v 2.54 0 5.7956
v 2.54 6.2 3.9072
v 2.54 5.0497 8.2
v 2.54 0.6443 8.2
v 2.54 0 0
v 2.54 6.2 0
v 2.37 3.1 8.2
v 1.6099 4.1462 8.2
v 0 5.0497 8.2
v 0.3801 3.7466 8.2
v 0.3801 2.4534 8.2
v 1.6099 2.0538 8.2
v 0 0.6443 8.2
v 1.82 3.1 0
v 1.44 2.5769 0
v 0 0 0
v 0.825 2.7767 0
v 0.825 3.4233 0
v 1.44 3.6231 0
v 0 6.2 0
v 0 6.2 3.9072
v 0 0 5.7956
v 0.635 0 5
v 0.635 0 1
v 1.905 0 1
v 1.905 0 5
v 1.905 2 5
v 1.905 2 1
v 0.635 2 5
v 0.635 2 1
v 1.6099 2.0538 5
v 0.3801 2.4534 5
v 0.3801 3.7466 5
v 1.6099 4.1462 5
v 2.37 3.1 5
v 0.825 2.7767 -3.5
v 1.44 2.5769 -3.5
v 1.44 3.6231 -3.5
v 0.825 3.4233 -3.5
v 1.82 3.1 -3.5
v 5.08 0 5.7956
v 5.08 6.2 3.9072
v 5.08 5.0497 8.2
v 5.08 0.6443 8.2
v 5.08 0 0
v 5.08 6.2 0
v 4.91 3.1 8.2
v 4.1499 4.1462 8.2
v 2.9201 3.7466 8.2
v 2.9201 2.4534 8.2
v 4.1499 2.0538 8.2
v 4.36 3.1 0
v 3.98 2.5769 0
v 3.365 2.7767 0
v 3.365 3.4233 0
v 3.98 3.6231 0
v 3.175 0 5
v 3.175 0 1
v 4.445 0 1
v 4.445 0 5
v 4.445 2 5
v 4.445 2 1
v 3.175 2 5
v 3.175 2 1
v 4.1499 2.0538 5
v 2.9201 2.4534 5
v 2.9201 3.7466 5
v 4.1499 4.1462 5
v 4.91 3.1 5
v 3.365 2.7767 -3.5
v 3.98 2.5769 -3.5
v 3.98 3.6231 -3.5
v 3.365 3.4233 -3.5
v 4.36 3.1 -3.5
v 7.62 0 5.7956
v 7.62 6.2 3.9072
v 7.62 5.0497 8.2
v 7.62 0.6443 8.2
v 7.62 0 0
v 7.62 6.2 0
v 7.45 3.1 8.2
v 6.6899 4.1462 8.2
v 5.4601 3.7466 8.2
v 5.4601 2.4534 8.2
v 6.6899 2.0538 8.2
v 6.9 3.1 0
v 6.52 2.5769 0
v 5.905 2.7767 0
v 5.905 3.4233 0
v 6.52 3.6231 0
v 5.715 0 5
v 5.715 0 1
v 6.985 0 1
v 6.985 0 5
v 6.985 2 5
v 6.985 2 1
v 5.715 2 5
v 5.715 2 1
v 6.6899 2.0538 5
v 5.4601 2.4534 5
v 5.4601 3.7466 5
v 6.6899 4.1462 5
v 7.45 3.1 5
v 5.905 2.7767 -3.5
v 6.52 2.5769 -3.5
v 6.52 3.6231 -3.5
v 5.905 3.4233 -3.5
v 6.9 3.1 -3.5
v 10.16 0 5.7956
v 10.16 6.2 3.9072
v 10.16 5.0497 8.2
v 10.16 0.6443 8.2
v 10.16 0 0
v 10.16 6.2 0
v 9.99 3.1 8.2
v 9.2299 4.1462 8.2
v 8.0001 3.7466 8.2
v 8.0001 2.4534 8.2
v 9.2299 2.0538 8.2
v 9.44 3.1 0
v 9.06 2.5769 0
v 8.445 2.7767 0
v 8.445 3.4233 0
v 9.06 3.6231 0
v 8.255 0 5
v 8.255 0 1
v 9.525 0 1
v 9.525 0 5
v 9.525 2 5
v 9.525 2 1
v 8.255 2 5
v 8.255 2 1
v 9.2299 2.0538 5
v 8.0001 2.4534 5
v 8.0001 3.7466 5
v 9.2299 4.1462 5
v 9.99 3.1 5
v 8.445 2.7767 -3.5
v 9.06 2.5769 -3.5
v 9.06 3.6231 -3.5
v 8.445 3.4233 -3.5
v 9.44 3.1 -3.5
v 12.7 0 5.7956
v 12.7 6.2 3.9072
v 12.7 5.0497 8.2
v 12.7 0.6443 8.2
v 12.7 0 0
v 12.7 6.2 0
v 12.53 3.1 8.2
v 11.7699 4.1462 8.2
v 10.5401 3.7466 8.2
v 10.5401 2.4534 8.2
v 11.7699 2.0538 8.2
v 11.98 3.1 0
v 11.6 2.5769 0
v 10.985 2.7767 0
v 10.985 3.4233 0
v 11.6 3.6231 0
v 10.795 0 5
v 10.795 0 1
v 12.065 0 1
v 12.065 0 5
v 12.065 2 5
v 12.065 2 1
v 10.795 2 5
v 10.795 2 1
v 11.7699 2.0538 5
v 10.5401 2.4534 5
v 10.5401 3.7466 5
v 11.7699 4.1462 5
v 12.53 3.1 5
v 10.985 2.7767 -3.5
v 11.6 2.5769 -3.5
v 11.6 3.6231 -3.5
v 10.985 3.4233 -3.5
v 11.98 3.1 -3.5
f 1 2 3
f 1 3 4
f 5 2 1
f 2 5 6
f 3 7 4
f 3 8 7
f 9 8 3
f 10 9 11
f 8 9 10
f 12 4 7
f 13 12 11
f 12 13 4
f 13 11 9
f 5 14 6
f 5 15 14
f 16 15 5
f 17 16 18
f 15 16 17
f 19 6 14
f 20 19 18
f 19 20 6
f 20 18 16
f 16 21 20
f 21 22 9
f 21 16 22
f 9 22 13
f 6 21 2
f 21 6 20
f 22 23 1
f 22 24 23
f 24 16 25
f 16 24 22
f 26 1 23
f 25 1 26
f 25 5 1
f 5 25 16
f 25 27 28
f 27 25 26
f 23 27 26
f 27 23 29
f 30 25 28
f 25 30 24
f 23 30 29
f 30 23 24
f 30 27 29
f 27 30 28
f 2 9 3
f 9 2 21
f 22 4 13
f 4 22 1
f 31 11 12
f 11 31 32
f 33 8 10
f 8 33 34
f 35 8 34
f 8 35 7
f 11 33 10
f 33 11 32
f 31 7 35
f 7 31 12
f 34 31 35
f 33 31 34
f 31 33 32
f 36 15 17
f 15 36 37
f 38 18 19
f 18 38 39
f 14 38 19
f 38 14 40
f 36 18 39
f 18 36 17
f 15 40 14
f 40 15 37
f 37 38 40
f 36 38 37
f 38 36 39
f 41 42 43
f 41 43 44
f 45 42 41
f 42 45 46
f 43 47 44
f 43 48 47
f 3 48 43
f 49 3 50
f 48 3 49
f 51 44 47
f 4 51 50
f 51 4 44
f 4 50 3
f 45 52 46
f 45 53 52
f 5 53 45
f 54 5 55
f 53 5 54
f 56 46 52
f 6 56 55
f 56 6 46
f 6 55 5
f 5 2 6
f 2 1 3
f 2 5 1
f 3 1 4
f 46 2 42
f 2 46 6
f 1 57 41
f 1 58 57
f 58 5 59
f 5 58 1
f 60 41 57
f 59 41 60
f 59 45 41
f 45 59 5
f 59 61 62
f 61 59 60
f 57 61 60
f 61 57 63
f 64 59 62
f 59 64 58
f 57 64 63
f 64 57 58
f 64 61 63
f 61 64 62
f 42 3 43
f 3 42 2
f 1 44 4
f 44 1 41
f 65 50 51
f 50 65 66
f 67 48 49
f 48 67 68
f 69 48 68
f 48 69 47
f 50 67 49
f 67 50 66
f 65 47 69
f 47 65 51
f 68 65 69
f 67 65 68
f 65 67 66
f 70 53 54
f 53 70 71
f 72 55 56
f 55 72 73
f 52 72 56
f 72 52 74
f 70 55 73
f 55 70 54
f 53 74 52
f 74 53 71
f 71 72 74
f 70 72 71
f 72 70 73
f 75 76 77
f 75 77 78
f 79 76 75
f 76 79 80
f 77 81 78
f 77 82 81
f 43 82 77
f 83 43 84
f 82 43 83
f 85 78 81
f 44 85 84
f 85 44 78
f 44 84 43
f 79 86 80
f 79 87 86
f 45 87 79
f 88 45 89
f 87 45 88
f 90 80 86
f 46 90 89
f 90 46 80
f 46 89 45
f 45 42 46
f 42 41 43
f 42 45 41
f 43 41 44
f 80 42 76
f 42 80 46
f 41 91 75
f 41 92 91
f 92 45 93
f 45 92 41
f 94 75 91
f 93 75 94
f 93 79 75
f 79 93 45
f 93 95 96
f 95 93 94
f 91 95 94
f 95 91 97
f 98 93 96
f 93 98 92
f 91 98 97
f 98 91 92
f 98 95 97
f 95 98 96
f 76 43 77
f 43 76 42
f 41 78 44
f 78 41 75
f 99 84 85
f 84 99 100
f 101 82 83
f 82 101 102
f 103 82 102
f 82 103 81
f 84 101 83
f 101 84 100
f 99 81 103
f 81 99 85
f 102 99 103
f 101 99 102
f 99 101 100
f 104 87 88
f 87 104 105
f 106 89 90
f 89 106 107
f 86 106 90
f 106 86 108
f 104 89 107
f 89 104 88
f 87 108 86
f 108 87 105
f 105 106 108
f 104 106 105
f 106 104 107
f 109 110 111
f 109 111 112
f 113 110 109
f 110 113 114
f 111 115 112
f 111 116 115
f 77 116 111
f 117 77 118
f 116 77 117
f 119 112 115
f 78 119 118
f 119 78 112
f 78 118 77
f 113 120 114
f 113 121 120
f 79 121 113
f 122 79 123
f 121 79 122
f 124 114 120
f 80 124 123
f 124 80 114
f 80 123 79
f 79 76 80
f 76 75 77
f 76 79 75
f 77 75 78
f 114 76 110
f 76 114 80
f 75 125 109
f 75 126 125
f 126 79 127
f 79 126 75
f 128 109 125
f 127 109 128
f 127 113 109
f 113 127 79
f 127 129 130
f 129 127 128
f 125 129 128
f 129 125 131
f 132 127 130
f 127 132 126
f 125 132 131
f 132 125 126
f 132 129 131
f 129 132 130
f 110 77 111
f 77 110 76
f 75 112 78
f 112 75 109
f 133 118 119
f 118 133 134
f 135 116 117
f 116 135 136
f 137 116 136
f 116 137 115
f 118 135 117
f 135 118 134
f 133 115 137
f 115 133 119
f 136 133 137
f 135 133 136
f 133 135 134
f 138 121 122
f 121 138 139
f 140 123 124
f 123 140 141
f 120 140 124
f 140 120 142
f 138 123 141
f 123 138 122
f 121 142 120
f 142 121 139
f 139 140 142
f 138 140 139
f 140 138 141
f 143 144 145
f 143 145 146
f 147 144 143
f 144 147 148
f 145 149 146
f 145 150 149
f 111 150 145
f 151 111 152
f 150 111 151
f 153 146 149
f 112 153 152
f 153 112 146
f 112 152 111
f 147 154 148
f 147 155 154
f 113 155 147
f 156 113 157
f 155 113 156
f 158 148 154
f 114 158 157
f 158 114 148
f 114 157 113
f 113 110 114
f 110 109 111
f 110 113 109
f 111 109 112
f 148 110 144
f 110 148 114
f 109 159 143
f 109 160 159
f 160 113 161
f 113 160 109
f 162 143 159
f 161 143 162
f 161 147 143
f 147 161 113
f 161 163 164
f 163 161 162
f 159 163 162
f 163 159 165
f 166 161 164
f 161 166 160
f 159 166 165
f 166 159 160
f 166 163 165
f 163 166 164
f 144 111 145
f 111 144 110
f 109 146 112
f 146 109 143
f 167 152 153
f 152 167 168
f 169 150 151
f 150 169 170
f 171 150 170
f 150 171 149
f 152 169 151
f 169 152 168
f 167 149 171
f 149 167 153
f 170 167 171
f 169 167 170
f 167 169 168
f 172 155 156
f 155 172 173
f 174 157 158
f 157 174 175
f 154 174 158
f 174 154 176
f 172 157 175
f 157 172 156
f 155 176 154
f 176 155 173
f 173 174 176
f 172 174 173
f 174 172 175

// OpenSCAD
module block(){
    difference(){
        difference(){
            difference(){
                difference(){
                    cube([2.54,6.2,8.2]);
                    translate([2.54/2/2,-1,1])
                        cube([2.54/2,3,4]);
                };
                rotate([15, 0, 0])
                    translate([-1, 7, 0])
                        cube([4, 6, 8]);
            }
            rotate([-15, 0, 0])
                translate([-1, -7.5, 0])
                    cube([4, 6, 9]);
        };
        translate([2.54/2, 3.1, 5])
            cylinder(3.5, 1.1,1.1);        
    }
    translate([2.54/2, 3.1, -3.5])
        cylinder(3.5, 1.1/2,1.1/2);
}

for(i=[1 : 5]){
    translate([ (i-1) * 2.54, 0, 0])
        block();
}
